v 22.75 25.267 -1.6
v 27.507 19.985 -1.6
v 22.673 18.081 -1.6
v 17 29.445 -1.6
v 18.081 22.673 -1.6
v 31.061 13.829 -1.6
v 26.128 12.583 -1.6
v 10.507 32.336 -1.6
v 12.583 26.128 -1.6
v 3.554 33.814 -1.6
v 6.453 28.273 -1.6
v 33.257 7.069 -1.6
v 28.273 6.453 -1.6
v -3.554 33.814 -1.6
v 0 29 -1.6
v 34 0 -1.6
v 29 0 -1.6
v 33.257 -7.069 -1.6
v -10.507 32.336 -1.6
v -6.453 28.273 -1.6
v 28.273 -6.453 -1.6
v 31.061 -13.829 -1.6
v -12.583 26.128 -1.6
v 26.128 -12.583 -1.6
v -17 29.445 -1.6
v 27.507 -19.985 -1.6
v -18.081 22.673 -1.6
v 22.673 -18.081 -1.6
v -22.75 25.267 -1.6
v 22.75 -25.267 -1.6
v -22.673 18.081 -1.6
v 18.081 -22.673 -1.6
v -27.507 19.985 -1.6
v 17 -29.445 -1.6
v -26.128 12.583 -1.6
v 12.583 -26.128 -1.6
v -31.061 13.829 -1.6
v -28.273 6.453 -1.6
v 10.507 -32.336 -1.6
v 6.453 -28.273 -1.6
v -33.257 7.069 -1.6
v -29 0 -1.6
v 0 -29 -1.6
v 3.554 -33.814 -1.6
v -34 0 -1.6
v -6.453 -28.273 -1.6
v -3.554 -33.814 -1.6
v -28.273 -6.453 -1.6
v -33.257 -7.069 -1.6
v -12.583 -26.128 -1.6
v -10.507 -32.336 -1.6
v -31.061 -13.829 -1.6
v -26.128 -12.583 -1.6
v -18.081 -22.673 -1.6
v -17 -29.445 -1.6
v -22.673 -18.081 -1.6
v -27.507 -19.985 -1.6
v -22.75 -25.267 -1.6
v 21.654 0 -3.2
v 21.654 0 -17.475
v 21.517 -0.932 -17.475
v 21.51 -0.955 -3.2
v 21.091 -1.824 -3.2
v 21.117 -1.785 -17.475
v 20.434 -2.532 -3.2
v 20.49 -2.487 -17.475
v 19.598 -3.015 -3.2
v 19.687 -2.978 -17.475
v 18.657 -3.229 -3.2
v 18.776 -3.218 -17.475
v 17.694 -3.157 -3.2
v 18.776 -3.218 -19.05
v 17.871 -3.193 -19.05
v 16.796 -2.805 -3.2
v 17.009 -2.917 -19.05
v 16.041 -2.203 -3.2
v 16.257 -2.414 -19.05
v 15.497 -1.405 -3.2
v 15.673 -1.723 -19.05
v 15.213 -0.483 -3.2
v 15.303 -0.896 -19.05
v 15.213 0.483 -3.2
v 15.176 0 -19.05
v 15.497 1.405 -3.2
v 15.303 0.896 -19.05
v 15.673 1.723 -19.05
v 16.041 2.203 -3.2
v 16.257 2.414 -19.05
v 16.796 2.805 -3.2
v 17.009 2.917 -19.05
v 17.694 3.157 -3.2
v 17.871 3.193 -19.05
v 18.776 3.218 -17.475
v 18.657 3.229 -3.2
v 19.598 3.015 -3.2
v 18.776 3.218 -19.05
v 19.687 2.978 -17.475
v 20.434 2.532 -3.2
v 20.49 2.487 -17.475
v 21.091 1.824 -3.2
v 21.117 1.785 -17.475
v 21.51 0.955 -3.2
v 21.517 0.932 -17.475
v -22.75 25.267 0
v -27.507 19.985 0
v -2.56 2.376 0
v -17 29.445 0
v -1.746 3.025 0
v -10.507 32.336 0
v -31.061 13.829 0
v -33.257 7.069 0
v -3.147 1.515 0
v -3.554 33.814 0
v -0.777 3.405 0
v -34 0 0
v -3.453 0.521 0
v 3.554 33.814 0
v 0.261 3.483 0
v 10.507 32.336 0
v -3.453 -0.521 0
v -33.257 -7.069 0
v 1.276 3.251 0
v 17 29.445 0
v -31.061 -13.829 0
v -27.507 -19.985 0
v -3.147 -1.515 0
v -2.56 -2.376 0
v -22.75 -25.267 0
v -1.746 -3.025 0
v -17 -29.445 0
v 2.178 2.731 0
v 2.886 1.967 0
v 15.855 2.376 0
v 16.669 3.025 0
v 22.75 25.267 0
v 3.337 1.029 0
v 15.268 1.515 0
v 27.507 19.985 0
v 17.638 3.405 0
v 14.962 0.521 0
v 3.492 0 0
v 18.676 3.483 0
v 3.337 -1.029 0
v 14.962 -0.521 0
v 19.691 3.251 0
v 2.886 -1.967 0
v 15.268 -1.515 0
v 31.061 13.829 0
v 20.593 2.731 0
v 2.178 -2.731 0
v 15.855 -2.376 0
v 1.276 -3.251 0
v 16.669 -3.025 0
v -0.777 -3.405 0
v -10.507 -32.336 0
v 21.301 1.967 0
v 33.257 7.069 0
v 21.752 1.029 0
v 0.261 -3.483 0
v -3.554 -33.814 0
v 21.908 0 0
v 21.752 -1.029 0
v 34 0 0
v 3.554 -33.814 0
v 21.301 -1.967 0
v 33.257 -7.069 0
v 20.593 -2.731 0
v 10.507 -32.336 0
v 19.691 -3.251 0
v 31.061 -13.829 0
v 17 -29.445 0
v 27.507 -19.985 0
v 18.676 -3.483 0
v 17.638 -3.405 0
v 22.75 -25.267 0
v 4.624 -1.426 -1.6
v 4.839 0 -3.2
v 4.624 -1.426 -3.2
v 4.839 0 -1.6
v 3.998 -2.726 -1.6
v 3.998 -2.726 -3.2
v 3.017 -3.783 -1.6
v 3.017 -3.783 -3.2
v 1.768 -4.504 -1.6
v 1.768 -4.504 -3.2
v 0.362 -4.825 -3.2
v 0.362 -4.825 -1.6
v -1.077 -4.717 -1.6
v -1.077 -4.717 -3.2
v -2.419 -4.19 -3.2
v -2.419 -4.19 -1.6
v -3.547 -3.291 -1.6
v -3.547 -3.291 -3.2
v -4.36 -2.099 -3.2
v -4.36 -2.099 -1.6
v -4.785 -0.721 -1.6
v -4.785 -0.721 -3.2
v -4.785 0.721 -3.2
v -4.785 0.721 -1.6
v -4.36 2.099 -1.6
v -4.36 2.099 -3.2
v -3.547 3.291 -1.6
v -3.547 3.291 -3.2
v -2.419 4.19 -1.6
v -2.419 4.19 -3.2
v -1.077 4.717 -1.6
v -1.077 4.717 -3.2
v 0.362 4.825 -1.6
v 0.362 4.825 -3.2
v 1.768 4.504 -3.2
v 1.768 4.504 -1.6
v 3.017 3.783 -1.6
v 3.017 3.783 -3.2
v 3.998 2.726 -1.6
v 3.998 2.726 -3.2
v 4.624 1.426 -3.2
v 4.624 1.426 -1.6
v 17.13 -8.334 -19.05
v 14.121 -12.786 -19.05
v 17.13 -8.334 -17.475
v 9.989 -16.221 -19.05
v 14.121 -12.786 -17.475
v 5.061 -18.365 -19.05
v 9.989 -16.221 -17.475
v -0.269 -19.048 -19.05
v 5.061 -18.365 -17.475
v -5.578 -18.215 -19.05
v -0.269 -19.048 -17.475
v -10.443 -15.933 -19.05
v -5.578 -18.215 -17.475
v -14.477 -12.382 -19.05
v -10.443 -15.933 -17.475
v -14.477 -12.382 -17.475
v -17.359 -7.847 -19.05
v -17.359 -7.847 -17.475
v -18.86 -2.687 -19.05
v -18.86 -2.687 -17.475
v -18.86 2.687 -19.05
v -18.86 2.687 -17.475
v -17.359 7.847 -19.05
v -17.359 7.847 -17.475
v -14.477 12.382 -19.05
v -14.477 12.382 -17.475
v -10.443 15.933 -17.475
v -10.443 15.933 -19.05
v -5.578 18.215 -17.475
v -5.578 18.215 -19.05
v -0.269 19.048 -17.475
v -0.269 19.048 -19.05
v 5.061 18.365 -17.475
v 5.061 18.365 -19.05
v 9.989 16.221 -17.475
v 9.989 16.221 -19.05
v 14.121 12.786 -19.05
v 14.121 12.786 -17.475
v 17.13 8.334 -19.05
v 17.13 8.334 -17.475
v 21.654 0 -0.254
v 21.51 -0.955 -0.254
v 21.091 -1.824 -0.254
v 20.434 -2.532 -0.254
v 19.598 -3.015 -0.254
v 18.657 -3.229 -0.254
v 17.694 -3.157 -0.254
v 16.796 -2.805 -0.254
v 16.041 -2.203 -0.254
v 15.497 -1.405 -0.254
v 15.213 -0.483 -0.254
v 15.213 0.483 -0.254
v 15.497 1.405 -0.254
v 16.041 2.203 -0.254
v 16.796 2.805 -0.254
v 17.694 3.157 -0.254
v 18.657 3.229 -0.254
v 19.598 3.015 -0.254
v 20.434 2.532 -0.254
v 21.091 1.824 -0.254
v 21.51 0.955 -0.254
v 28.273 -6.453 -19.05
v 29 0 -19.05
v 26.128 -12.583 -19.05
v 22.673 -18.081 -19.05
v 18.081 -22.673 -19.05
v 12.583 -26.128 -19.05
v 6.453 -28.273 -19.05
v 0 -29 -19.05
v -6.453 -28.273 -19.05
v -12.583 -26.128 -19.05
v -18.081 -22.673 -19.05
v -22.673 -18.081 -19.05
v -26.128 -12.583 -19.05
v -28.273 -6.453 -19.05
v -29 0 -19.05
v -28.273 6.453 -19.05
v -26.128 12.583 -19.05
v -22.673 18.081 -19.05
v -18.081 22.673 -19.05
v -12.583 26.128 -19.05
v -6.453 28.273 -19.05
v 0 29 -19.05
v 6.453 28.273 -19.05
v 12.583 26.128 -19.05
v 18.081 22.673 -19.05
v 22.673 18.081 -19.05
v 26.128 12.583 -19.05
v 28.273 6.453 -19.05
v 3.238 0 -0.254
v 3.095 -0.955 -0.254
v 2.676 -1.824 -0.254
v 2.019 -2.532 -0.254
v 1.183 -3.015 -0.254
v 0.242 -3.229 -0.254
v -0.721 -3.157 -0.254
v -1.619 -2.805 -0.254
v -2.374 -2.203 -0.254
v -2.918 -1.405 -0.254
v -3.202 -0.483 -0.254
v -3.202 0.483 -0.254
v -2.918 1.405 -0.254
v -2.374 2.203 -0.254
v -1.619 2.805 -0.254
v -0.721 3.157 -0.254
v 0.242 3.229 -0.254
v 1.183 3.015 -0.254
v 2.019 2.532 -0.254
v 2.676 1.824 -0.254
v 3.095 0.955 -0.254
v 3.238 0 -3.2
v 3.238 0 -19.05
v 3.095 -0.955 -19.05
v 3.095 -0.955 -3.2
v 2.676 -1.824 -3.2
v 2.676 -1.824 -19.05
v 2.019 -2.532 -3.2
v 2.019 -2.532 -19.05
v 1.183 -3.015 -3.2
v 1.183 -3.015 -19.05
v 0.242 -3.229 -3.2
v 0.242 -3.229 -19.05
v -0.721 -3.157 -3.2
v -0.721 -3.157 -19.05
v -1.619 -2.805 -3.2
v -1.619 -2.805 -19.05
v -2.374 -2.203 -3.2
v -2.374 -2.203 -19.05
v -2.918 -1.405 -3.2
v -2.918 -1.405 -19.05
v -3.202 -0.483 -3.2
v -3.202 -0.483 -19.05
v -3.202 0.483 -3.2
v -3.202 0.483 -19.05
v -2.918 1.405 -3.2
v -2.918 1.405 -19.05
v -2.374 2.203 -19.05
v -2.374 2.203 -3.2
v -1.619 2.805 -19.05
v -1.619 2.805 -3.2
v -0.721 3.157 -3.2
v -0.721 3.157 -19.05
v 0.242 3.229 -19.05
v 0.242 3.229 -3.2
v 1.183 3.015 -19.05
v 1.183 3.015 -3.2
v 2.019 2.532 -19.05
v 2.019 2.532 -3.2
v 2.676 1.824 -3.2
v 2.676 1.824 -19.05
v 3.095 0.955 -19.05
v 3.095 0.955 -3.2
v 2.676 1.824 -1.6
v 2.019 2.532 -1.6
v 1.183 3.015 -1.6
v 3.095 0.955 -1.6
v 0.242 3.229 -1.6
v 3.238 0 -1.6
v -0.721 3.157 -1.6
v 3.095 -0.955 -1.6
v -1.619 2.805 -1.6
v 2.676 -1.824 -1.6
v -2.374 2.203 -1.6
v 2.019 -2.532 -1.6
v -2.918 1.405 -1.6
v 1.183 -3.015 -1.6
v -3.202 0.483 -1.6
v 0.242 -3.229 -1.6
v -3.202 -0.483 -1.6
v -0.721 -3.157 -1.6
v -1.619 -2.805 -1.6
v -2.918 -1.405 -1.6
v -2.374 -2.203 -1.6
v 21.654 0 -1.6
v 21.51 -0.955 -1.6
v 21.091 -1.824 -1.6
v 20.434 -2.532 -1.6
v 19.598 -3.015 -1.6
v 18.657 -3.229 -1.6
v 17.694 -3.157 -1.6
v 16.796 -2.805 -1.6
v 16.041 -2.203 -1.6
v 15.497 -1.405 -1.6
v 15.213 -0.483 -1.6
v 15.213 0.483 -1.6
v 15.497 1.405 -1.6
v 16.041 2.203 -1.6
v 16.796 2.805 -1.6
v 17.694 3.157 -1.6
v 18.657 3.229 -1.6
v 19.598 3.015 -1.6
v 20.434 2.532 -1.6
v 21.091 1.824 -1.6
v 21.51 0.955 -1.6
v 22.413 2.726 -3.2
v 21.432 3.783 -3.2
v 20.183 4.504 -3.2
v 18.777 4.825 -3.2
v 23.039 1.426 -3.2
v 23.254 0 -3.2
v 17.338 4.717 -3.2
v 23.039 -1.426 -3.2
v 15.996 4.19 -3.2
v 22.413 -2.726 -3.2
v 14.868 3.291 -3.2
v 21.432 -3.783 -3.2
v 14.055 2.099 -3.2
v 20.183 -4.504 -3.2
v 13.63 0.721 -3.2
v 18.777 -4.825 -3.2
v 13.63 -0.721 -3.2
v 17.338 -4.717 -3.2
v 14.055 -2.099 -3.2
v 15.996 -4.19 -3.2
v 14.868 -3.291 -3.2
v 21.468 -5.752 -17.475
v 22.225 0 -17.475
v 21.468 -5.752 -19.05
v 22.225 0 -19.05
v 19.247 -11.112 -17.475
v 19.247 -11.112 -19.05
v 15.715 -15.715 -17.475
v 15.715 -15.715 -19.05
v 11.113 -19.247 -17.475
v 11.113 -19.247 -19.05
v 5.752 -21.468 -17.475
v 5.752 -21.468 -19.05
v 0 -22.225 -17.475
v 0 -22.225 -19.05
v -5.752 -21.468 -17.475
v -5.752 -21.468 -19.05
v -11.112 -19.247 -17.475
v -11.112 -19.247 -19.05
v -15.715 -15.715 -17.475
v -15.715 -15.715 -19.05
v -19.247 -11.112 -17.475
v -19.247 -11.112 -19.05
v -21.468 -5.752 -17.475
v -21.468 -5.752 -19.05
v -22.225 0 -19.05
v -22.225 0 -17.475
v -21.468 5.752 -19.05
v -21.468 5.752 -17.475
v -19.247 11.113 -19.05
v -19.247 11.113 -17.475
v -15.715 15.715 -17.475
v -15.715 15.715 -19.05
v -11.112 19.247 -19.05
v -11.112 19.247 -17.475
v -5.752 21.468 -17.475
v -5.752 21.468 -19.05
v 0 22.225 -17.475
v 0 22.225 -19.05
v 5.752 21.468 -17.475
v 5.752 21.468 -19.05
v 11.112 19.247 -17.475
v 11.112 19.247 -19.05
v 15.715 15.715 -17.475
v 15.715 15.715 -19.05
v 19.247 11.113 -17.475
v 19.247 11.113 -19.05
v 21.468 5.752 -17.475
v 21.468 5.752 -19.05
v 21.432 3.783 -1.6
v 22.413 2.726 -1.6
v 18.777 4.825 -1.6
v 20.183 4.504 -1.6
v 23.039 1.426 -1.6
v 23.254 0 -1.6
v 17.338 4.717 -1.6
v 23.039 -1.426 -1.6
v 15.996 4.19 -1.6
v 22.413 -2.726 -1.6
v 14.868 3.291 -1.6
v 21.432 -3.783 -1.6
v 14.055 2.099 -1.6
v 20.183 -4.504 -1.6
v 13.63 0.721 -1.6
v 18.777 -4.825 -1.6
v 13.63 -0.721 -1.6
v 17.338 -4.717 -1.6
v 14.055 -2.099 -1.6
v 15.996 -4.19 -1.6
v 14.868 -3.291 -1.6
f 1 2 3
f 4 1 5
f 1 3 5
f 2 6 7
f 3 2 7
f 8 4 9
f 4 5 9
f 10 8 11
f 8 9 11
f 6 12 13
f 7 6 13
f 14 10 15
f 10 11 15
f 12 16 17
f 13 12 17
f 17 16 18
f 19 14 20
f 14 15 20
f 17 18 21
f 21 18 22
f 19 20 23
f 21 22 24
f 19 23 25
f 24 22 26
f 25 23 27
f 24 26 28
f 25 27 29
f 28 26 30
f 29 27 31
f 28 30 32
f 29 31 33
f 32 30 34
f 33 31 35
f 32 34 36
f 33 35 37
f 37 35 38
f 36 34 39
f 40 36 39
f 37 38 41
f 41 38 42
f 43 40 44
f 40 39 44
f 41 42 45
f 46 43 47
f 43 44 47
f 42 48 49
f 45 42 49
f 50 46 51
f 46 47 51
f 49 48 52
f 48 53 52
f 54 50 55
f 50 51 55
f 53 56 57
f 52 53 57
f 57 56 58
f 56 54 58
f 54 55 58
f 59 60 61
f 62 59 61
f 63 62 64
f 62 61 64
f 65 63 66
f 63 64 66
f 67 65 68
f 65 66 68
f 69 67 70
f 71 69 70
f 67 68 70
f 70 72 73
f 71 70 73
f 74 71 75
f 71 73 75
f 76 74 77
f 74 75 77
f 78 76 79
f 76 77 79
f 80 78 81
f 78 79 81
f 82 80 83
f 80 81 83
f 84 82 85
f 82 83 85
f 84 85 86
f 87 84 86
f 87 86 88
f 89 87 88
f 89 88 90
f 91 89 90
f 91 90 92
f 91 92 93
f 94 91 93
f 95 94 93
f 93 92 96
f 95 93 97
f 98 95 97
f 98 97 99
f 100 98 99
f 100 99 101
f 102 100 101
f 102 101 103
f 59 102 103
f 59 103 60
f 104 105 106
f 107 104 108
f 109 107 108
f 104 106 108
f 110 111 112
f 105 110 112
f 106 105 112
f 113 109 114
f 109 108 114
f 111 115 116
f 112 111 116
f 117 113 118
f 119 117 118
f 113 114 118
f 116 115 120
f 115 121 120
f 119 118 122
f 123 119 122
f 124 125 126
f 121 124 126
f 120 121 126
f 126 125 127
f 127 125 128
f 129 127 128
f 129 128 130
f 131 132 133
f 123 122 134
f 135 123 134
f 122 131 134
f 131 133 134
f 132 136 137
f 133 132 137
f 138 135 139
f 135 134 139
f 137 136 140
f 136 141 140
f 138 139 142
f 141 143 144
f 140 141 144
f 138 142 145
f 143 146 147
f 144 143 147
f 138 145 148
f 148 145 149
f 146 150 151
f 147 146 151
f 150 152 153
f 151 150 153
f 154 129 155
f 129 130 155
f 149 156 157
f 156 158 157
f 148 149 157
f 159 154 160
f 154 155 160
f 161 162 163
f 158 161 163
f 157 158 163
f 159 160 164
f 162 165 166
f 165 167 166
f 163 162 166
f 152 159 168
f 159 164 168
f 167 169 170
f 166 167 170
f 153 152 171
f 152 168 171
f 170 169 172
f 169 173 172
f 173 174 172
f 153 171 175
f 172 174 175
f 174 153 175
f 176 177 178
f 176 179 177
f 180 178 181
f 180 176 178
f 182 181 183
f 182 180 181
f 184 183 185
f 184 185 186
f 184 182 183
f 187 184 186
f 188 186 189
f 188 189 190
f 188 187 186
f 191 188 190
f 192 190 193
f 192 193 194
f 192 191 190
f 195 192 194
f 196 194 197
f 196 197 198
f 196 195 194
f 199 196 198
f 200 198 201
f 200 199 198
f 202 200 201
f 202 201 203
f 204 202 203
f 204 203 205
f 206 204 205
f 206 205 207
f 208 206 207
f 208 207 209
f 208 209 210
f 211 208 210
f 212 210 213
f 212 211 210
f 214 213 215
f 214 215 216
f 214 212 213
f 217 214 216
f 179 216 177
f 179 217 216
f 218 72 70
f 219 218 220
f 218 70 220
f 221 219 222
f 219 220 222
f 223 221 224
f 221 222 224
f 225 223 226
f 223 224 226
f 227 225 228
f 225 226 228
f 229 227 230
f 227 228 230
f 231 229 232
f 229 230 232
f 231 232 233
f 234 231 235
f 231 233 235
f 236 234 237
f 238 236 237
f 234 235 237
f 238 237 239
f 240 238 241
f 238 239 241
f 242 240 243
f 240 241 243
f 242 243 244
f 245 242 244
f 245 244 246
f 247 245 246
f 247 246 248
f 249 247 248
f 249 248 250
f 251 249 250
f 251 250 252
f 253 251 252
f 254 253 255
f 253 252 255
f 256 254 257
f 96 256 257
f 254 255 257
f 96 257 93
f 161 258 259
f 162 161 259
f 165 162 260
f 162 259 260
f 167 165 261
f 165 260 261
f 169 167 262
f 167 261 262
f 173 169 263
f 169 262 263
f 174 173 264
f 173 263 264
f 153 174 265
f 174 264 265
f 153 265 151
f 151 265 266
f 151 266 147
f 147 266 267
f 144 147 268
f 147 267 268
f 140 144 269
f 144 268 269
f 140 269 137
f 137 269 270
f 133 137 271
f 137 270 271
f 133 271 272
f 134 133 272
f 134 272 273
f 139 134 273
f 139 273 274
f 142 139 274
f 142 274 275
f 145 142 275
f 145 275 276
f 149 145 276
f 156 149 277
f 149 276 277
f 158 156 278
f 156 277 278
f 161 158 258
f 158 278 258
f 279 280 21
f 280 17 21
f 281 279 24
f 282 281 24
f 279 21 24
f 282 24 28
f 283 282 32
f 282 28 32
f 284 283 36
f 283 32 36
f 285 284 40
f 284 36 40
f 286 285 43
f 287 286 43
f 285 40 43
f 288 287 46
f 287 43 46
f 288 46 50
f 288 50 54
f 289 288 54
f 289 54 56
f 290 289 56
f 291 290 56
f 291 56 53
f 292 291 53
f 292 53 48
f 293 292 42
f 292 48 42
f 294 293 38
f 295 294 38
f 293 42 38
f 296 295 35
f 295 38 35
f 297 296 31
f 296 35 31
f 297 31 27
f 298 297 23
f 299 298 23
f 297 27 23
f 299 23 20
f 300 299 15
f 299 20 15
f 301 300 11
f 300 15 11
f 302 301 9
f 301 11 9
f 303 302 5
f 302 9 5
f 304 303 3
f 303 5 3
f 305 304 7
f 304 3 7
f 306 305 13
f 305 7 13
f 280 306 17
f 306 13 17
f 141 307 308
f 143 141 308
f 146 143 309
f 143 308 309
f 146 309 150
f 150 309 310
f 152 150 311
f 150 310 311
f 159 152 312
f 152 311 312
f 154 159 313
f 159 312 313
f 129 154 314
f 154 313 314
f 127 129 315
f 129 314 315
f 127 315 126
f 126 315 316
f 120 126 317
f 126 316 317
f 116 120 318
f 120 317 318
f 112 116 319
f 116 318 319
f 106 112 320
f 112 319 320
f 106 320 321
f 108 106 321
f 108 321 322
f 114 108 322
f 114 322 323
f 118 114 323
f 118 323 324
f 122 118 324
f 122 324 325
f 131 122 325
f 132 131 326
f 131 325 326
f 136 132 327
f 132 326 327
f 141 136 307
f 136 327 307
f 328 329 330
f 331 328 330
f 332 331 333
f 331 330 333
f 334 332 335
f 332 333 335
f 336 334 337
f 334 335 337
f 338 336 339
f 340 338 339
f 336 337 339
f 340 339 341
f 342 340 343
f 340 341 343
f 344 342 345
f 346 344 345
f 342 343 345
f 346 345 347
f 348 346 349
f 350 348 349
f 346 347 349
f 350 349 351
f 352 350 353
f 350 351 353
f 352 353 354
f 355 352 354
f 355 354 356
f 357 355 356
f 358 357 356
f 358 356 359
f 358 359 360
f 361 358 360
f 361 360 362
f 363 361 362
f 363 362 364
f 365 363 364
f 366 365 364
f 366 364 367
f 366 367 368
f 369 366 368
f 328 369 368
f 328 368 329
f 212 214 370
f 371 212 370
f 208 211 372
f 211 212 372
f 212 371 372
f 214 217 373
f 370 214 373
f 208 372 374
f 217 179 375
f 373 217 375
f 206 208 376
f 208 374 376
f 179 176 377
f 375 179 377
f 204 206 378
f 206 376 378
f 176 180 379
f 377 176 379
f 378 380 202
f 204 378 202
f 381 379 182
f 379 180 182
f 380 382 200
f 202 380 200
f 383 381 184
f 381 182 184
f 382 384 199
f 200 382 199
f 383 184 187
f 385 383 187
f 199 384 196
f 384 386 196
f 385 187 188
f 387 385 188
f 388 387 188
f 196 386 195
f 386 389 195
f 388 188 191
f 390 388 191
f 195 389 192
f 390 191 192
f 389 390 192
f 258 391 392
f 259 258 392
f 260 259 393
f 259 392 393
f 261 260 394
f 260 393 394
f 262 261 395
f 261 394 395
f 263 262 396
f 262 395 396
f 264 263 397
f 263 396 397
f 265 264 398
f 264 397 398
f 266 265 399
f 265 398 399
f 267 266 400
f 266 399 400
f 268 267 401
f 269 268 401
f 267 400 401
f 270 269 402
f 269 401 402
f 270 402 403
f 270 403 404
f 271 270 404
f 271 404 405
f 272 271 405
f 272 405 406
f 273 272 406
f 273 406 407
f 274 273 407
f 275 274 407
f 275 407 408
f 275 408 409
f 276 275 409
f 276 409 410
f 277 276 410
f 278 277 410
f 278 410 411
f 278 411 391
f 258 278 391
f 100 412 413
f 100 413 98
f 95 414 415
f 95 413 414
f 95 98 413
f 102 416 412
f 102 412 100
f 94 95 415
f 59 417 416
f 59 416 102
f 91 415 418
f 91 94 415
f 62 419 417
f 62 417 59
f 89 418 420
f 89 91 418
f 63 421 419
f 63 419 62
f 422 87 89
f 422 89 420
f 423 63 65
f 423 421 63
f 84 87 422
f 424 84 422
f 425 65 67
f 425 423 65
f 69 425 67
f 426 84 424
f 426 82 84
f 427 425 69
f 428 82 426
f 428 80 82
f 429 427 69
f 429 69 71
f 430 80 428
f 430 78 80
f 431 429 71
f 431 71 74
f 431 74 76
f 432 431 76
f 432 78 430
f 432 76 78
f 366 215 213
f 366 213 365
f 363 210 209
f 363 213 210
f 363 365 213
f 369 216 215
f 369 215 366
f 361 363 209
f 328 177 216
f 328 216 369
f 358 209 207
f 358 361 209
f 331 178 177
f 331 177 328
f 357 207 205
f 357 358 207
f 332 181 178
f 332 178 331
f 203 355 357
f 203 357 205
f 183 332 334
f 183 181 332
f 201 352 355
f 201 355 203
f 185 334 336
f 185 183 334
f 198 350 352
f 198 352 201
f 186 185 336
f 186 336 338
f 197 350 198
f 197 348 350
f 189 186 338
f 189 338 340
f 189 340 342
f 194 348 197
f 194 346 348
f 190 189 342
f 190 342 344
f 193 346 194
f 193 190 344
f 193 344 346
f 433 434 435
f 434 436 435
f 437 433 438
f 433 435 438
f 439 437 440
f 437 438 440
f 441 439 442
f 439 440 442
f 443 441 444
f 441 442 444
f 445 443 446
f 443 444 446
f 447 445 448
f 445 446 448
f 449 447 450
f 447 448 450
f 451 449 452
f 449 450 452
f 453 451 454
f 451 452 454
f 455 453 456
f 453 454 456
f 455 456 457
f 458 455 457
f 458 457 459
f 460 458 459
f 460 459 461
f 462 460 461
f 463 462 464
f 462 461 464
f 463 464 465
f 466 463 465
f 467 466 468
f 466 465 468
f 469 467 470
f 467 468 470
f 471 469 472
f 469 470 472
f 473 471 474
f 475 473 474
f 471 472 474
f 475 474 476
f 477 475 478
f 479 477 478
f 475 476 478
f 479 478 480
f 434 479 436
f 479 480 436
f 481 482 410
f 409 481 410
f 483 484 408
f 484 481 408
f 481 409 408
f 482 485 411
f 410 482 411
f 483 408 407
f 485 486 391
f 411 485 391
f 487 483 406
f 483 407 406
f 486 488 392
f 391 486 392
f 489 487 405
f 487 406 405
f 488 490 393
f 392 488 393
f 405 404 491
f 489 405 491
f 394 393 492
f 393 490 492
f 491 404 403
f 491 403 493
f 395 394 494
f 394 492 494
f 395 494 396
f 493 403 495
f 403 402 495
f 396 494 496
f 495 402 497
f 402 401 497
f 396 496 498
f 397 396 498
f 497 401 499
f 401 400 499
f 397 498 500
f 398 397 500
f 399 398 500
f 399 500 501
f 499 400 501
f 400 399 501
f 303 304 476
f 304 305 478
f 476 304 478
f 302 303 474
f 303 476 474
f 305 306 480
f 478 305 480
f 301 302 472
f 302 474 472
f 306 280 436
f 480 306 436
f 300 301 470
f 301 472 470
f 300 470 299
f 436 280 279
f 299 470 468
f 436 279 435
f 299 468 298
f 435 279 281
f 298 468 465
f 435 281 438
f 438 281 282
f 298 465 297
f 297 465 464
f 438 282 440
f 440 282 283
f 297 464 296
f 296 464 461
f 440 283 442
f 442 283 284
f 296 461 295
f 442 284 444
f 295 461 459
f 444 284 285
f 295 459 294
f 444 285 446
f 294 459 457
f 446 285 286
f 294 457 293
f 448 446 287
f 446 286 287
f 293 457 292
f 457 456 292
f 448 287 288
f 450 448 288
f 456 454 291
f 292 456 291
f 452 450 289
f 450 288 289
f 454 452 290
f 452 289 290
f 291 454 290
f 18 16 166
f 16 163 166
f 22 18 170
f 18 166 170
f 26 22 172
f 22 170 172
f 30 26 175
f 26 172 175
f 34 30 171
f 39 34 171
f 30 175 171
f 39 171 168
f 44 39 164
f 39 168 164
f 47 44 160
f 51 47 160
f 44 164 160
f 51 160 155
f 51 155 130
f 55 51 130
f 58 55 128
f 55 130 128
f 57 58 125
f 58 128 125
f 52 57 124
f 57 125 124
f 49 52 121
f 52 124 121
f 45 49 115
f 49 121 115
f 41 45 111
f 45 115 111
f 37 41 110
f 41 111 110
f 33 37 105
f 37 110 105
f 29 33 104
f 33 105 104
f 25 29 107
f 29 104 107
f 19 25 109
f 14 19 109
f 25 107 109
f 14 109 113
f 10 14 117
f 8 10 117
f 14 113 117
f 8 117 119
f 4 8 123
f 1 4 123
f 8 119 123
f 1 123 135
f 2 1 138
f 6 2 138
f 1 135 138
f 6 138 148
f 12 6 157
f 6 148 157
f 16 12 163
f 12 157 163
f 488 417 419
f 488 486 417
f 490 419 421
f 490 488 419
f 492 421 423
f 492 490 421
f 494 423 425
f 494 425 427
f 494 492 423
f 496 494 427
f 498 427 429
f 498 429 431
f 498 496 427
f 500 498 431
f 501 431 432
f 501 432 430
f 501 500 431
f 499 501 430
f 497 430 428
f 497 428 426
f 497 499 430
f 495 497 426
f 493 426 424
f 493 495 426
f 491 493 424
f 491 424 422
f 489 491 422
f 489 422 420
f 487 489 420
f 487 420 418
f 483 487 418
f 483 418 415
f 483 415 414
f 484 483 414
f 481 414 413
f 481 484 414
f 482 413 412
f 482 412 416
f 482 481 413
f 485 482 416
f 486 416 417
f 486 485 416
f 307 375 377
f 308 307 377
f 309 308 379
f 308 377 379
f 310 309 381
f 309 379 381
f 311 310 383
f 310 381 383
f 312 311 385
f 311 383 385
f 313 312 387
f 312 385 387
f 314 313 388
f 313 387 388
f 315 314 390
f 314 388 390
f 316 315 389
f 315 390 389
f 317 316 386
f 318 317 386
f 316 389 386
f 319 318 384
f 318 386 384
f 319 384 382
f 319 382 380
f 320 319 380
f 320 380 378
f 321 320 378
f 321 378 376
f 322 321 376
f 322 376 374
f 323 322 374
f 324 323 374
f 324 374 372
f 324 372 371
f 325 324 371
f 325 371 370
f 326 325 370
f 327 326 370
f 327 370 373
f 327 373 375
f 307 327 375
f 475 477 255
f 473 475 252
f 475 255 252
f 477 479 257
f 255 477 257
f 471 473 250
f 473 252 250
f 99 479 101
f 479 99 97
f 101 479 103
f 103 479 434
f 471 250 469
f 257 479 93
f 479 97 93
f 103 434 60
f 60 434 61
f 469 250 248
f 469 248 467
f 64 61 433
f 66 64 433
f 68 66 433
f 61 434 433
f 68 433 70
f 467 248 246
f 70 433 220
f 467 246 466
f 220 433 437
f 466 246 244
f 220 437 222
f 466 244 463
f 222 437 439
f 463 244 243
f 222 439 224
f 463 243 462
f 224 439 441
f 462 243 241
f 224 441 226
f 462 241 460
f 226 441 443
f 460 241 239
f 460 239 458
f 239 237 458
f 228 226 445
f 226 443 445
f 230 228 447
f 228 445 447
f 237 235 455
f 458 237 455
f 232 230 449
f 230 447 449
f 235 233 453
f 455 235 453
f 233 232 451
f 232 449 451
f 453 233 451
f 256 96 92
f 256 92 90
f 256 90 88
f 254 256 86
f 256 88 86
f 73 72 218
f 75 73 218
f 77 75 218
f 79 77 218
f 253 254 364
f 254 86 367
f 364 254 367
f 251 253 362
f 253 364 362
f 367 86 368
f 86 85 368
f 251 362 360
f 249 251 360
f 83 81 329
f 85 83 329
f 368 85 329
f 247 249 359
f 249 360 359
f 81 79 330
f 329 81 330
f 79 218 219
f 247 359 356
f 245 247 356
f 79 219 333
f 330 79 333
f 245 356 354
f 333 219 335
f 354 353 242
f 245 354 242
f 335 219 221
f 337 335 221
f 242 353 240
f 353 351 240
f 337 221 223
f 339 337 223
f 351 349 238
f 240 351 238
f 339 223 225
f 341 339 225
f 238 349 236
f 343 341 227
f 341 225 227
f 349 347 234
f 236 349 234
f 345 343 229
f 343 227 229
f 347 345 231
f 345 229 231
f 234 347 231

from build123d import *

# Parameters (mm, degrees)
F2_R     = 3.2385
F3_DEPTH = 19.051
F4_W     = 1.6002
F4_H     = 1.6002
F6_W     = 1.6002
F6_H     = 1.6002
F8_SIZE  = 0.254


with BuildPart() as f1:
    # F0 (on Front) → F1 (revolve)
    with BuildSketch(Plane.XZ):
        Polygon((34, 0), (0, 0), (0, -19.05), (19.05, -19.05), (19.05, -17.4752), (22.225, -17.4752), (22.225, -19.05), (29, -19.05), (29, -1.6002), (34, -1.6002), align=None)
    revolve(axis=Axis((0, 0, -7.0298854262), (0, 0, -1)))

    # F2 (on face) → F3 (cut, through all)
    with BuildSketch(Plane(origin=(0, 0, -19.05), x_dir=(1, 0, 0), z_dir=(0, 0, -1))):
        Circle(F2_R)
        with Locations((18.415, 0)):
            Circle(F2_R)
    extrude(amount=-F3_DEPTH, mode=Mode.SUBTRACT)

    # F4 (on Front) → F5 (revolve, cut)
    with BuildSketch(Plane.XZ):
        with Locations((4.0386, -2.4003)):
            Rectangle(F4_W, F4_H)
    revolve(axis=Axis((0, 0, -2.3049995583), (0, 0, -1)), mode=Mode.SUBTRACT)

    # F6 (on Front) → F7 (revolve, cut)
    with BuildSketch(Plane.XZ):
        with Locations((22.4536, -2.4003)):
            Rectangle(F6_W, F6_H)
    revolve(axis=Axis((18.415, 0, -9.4374260038), (0, 0, -1)), mode=Mode.SUBTRACT)

    # F8
    f8_edges = [f1.edges().sort_by_distance(p)[0] for p in [
        (-3.2385, 0, 0),
        (15.1765, 0, 0),
    ]]
    chamfer(f8_edges, length=F8_SIZE)


solid = f1.part
